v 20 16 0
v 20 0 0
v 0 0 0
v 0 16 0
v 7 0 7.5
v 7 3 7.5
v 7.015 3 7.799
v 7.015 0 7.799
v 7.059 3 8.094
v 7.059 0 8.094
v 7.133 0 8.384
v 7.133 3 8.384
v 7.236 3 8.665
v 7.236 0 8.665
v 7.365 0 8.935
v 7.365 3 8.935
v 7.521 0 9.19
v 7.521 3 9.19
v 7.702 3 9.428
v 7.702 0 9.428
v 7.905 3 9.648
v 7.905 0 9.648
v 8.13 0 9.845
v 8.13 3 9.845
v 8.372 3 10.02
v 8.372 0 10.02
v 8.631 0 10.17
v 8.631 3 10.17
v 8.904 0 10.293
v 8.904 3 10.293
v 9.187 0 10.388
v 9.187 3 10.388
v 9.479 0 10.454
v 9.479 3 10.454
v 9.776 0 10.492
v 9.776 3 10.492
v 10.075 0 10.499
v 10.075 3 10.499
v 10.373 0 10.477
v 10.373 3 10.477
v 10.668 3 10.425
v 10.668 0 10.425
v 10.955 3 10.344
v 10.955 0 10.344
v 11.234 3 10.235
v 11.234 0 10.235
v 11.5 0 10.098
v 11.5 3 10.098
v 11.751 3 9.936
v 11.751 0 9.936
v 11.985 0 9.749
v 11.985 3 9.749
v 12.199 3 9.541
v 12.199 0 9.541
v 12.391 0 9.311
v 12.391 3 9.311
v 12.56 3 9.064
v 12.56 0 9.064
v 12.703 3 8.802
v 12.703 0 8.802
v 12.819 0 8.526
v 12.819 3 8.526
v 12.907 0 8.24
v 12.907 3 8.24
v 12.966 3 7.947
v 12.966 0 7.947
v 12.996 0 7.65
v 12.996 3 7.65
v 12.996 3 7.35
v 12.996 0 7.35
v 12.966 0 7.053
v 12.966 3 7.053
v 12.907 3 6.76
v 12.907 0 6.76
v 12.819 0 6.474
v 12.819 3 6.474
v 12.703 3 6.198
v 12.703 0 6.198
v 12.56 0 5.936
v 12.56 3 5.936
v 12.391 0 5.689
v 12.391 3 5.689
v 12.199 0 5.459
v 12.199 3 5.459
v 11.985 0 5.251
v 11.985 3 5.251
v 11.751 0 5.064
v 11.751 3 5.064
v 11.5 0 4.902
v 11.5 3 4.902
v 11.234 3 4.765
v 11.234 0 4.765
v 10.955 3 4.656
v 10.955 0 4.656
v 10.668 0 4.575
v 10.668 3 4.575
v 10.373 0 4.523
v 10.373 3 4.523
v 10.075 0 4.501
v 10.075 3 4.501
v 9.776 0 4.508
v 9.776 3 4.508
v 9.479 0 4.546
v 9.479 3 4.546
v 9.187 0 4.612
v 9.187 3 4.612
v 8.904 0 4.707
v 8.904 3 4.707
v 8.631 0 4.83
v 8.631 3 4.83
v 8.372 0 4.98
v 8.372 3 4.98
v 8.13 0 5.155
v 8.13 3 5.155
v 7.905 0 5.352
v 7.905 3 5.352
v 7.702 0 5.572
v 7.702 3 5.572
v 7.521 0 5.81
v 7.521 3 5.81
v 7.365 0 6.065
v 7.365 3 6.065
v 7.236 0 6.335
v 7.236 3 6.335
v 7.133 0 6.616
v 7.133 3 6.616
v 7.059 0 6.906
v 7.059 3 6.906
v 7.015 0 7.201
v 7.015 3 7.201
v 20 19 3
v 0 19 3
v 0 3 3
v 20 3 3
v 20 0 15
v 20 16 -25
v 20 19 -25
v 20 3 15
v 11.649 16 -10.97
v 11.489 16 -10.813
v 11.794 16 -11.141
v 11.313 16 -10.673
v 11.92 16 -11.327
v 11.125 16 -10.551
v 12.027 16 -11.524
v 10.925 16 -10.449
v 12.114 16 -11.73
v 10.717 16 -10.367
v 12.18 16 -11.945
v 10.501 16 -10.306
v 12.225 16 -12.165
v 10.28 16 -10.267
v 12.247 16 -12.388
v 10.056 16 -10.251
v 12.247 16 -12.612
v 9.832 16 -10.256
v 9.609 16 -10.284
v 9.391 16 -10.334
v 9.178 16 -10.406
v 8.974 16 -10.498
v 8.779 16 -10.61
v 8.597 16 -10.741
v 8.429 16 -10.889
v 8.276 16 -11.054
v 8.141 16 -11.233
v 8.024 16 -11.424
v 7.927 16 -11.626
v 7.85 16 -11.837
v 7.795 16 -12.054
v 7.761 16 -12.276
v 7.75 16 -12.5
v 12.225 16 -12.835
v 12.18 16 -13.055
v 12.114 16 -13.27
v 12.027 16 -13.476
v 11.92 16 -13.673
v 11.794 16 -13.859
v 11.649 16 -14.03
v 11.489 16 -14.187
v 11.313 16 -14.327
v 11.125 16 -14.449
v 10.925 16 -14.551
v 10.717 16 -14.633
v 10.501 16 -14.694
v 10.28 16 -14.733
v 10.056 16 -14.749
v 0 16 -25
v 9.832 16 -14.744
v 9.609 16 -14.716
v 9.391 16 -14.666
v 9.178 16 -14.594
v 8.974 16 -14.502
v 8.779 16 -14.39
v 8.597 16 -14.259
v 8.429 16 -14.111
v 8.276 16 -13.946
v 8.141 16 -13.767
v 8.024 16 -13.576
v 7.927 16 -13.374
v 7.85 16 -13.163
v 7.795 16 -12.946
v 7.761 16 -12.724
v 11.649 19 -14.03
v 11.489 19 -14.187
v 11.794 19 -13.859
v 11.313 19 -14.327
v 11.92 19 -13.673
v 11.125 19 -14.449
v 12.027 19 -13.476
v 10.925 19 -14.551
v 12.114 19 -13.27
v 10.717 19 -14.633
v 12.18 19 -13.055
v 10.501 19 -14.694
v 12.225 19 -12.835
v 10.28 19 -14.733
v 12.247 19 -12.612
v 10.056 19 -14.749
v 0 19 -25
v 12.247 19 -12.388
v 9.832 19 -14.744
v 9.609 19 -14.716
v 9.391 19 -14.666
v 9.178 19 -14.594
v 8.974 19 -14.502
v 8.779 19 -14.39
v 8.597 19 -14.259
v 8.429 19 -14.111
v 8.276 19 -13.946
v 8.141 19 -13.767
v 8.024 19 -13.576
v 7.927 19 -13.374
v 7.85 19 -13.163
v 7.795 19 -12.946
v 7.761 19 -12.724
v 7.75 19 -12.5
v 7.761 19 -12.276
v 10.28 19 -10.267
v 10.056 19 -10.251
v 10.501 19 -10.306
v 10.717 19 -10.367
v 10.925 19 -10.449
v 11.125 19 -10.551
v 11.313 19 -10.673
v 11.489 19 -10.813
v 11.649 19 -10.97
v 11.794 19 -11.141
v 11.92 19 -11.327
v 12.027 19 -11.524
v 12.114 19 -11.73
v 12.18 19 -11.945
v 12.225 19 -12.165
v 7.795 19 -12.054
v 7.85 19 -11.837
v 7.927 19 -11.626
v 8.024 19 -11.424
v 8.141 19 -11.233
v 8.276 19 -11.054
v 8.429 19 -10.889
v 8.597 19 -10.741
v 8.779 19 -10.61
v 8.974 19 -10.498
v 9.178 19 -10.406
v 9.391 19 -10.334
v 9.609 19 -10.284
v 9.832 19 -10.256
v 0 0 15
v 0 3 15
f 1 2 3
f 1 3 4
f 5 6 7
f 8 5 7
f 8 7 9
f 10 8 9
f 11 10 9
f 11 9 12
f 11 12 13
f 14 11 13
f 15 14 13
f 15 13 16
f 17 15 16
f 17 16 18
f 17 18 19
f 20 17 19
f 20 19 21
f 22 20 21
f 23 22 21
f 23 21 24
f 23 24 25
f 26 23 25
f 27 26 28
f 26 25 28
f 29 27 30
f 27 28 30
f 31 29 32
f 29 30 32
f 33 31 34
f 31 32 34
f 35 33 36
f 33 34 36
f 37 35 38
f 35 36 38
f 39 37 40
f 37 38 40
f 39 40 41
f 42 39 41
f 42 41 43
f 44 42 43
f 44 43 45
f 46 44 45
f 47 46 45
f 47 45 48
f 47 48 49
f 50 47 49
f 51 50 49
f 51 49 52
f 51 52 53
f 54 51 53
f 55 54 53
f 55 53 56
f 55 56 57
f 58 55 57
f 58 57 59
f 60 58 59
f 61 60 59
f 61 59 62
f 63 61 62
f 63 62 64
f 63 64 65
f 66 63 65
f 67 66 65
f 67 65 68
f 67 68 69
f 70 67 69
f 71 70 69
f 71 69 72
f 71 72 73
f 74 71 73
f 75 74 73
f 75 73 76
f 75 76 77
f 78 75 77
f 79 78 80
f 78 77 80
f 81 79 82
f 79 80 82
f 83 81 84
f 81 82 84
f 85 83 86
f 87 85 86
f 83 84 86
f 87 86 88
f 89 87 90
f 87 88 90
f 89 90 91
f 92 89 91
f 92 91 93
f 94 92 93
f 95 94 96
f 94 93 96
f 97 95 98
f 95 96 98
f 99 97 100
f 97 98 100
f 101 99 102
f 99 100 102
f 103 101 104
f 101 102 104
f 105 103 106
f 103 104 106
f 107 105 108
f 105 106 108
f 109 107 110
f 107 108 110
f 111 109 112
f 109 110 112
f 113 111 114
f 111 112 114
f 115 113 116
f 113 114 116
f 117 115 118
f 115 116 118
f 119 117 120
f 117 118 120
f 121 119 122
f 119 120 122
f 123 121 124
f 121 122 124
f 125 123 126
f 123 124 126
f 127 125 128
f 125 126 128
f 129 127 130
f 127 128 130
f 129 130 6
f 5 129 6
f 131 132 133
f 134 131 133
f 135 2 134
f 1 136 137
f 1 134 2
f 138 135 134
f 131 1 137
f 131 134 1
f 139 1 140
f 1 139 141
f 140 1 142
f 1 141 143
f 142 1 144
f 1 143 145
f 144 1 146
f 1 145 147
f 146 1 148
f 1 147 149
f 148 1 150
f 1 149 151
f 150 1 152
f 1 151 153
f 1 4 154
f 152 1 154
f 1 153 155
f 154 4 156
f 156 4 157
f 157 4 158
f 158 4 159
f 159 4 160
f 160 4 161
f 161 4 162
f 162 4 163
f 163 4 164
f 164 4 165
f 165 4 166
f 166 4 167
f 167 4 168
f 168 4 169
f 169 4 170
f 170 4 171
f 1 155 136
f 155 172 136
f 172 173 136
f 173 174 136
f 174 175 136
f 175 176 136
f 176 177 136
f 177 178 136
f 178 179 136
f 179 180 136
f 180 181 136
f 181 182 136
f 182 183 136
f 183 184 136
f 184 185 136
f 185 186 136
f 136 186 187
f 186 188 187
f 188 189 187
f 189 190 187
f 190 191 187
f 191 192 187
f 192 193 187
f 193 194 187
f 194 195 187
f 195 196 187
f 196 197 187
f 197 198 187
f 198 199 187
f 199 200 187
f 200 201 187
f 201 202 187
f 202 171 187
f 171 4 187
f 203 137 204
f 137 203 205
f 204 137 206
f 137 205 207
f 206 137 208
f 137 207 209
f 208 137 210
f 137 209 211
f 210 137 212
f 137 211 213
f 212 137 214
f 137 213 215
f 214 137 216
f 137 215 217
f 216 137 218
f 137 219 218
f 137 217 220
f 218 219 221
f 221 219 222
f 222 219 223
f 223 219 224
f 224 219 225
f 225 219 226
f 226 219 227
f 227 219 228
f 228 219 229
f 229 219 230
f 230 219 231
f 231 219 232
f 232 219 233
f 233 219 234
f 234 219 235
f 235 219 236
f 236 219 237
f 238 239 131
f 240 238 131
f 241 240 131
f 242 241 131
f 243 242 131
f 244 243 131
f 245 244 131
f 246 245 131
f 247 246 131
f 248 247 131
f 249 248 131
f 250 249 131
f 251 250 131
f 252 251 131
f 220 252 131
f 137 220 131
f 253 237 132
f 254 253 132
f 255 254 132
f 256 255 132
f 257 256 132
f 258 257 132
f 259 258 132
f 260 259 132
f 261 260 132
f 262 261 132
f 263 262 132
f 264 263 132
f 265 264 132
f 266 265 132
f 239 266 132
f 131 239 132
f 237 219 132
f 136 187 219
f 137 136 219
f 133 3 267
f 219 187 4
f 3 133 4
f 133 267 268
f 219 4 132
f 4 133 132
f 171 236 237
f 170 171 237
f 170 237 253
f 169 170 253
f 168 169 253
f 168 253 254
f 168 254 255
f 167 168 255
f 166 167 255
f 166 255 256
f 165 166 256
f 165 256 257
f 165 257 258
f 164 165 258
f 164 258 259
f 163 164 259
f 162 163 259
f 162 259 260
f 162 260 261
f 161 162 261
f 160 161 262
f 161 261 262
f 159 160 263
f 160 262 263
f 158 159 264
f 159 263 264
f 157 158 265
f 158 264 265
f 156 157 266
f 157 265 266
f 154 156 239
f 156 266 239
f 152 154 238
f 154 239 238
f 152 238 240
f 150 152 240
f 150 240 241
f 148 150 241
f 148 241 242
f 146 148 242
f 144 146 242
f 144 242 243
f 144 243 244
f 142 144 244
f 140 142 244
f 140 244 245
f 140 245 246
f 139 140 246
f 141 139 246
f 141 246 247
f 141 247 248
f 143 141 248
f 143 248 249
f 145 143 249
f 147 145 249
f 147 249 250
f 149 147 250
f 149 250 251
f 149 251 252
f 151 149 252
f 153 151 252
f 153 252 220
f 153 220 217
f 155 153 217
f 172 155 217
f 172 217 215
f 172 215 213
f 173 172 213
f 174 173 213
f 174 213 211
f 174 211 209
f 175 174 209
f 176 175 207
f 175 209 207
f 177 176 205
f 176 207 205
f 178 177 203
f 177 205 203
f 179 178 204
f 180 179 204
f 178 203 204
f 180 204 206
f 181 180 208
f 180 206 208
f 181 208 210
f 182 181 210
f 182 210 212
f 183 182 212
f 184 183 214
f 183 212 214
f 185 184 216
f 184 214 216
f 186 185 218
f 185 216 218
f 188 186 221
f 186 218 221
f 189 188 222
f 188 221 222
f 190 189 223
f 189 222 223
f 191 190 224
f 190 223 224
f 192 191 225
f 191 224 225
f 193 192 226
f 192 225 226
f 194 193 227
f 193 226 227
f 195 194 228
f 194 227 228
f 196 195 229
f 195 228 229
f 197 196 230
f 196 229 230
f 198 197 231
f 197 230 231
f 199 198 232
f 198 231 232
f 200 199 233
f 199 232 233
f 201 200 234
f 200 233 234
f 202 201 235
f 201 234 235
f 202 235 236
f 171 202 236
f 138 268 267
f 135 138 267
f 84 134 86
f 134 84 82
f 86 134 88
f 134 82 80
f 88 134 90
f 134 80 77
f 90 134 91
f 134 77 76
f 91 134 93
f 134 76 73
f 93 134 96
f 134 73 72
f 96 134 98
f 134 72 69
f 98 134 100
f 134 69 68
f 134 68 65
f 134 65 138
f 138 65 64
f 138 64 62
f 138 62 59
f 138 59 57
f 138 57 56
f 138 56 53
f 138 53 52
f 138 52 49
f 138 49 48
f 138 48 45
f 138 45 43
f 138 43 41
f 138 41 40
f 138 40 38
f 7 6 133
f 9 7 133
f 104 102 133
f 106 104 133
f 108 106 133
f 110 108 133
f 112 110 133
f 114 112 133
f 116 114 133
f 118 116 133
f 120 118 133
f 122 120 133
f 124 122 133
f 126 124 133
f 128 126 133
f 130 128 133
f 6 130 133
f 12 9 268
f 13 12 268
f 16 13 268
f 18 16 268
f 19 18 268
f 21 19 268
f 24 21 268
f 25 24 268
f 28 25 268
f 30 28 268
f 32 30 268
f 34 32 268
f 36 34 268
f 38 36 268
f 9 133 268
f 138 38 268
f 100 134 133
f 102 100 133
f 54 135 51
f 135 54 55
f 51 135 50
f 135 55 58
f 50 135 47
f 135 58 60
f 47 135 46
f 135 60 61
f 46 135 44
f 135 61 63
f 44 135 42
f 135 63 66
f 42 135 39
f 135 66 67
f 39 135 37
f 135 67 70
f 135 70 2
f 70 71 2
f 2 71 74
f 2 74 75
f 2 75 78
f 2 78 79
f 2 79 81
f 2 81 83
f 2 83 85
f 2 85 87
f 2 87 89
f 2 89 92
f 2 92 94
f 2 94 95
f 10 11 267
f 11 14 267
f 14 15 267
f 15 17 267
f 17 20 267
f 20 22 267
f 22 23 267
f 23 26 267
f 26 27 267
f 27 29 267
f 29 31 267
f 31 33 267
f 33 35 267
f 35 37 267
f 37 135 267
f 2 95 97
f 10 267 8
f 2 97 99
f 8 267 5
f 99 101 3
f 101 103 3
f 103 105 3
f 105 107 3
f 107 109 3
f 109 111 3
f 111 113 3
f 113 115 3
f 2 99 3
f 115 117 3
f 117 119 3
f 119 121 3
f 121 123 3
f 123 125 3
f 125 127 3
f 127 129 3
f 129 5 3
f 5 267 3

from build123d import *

# Parameters (mm, degrees)
F1_DEPTH = 20
F4_D     = 6
F5_D     = 4.5


with BuildPart() as f1:
    # F0 (on Right) → F1 (new body)
    with BuildSketch(Plane.YZ):
        Polygon((0, 15), (0, 0), (16, 0), (16, -25), (19, -25), (19, 3), (3, 3), (3, 15), align=None)
    extrude(amount=F1_DEPTH)

    # F4 (through all)
    with Locations(Plane.XZ):
        with Locations((10, 7.5)):
            Hole(F4_D / 2)

    # F5 (through all)
    with Locations(Plane.XZ.offset(-16)):
        with Locations((10, -12.5)):
            Hole(F5_D / 2)


solid = f1.part
